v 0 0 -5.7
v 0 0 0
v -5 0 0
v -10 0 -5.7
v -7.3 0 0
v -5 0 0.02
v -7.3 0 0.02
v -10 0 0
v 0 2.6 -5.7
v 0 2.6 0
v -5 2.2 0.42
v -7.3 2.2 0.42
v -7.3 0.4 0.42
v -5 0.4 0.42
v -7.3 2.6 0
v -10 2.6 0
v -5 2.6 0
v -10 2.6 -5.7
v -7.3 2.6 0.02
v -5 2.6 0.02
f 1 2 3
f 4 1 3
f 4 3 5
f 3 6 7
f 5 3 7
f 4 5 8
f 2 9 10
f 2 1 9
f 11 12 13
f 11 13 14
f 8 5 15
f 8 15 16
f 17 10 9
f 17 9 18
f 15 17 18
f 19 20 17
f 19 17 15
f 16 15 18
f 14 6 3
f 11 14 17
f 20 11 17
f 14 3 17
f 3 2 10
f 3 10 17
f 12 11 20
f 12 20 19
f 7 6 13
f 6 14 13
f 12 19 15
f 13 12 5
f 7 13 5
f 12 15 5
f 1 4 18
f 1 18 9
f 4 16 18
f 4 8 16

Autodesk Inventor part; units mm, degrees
ref_plane "YZ Plane" through (0, 0, 0) normal (1, 0, 0) x (0, 1, 0)
ref_plane "XZ Plane" through (0, 0, 0) normal (0, 1, 0) x (-1, 0, 0)
ref_plane "XY Plane" through (0, 0, 0) normal (0, 0, 1) x (1, 0, 0)
sketch "Szkic1" plane through (0, 0, 0) normal (0, 1, 0) x (-1, 0, 0)
  line L0 (0, 0) -> (10, 0)
  line L1 (10, 0) -> (10, -5.7)
  line L2 (10, -5.7) -> (0, -5.7)
  line L3 (0, -5.7) -> (0, 0)
  dimension "d0" = 10
  dimension "d1" = 5.7
extrude "Wyciągnięcie proste1" add sketch "Szkic1" along normal blind 2.6
sketch "Szkic2" plane through (-10, 0, 0) normal (0, 0, 1) x (1, 0, 0)
  line L0 (0, 0) -> (10, 0) projected
  line L1 (10, 0) -> (10, 2.6) projected
  line L2 (0, 2.6) -> (10, 2.6) projected
  line L3 (0, 0) -> (0, 2.6) projected
  line L4 (0, 0) -> (0, 2.6) projected
  line L5 (10, 0) -> (0, 0) projected
  line L6 (0, 2.6) -> (2.7, 2.6)
  line L7 (2.7, 2.6) -> (2.7, 0)
  line L8 (2.7, 0) -> (0, 0)
  line L9 (0, 0) -> (0, 2.6)
  line L10 (10, 2.6) -> (0, 2.6) projected
  line L11 (2.7, 0) -> (5, 0)
  line L12 (5, 0) -> (5, 2.6)
  line L13 (5, 2.6) -> (2.7, 2.6)
  line L14 (2.7, 2.6) -> (2.7, 0)
  dimension "d4" = 2.7
extrude "Wyciągnięcie proste2" add sketch "Szkic2" along normal blind 0.42 contours L7 L2 L12 L0
chamfer "Faza1" distance 0.4 angle 45 2 edges at (-6.15, 2.6, 0.42) (-6.15, 0, 0.42)
properties part number "wlacznik"
